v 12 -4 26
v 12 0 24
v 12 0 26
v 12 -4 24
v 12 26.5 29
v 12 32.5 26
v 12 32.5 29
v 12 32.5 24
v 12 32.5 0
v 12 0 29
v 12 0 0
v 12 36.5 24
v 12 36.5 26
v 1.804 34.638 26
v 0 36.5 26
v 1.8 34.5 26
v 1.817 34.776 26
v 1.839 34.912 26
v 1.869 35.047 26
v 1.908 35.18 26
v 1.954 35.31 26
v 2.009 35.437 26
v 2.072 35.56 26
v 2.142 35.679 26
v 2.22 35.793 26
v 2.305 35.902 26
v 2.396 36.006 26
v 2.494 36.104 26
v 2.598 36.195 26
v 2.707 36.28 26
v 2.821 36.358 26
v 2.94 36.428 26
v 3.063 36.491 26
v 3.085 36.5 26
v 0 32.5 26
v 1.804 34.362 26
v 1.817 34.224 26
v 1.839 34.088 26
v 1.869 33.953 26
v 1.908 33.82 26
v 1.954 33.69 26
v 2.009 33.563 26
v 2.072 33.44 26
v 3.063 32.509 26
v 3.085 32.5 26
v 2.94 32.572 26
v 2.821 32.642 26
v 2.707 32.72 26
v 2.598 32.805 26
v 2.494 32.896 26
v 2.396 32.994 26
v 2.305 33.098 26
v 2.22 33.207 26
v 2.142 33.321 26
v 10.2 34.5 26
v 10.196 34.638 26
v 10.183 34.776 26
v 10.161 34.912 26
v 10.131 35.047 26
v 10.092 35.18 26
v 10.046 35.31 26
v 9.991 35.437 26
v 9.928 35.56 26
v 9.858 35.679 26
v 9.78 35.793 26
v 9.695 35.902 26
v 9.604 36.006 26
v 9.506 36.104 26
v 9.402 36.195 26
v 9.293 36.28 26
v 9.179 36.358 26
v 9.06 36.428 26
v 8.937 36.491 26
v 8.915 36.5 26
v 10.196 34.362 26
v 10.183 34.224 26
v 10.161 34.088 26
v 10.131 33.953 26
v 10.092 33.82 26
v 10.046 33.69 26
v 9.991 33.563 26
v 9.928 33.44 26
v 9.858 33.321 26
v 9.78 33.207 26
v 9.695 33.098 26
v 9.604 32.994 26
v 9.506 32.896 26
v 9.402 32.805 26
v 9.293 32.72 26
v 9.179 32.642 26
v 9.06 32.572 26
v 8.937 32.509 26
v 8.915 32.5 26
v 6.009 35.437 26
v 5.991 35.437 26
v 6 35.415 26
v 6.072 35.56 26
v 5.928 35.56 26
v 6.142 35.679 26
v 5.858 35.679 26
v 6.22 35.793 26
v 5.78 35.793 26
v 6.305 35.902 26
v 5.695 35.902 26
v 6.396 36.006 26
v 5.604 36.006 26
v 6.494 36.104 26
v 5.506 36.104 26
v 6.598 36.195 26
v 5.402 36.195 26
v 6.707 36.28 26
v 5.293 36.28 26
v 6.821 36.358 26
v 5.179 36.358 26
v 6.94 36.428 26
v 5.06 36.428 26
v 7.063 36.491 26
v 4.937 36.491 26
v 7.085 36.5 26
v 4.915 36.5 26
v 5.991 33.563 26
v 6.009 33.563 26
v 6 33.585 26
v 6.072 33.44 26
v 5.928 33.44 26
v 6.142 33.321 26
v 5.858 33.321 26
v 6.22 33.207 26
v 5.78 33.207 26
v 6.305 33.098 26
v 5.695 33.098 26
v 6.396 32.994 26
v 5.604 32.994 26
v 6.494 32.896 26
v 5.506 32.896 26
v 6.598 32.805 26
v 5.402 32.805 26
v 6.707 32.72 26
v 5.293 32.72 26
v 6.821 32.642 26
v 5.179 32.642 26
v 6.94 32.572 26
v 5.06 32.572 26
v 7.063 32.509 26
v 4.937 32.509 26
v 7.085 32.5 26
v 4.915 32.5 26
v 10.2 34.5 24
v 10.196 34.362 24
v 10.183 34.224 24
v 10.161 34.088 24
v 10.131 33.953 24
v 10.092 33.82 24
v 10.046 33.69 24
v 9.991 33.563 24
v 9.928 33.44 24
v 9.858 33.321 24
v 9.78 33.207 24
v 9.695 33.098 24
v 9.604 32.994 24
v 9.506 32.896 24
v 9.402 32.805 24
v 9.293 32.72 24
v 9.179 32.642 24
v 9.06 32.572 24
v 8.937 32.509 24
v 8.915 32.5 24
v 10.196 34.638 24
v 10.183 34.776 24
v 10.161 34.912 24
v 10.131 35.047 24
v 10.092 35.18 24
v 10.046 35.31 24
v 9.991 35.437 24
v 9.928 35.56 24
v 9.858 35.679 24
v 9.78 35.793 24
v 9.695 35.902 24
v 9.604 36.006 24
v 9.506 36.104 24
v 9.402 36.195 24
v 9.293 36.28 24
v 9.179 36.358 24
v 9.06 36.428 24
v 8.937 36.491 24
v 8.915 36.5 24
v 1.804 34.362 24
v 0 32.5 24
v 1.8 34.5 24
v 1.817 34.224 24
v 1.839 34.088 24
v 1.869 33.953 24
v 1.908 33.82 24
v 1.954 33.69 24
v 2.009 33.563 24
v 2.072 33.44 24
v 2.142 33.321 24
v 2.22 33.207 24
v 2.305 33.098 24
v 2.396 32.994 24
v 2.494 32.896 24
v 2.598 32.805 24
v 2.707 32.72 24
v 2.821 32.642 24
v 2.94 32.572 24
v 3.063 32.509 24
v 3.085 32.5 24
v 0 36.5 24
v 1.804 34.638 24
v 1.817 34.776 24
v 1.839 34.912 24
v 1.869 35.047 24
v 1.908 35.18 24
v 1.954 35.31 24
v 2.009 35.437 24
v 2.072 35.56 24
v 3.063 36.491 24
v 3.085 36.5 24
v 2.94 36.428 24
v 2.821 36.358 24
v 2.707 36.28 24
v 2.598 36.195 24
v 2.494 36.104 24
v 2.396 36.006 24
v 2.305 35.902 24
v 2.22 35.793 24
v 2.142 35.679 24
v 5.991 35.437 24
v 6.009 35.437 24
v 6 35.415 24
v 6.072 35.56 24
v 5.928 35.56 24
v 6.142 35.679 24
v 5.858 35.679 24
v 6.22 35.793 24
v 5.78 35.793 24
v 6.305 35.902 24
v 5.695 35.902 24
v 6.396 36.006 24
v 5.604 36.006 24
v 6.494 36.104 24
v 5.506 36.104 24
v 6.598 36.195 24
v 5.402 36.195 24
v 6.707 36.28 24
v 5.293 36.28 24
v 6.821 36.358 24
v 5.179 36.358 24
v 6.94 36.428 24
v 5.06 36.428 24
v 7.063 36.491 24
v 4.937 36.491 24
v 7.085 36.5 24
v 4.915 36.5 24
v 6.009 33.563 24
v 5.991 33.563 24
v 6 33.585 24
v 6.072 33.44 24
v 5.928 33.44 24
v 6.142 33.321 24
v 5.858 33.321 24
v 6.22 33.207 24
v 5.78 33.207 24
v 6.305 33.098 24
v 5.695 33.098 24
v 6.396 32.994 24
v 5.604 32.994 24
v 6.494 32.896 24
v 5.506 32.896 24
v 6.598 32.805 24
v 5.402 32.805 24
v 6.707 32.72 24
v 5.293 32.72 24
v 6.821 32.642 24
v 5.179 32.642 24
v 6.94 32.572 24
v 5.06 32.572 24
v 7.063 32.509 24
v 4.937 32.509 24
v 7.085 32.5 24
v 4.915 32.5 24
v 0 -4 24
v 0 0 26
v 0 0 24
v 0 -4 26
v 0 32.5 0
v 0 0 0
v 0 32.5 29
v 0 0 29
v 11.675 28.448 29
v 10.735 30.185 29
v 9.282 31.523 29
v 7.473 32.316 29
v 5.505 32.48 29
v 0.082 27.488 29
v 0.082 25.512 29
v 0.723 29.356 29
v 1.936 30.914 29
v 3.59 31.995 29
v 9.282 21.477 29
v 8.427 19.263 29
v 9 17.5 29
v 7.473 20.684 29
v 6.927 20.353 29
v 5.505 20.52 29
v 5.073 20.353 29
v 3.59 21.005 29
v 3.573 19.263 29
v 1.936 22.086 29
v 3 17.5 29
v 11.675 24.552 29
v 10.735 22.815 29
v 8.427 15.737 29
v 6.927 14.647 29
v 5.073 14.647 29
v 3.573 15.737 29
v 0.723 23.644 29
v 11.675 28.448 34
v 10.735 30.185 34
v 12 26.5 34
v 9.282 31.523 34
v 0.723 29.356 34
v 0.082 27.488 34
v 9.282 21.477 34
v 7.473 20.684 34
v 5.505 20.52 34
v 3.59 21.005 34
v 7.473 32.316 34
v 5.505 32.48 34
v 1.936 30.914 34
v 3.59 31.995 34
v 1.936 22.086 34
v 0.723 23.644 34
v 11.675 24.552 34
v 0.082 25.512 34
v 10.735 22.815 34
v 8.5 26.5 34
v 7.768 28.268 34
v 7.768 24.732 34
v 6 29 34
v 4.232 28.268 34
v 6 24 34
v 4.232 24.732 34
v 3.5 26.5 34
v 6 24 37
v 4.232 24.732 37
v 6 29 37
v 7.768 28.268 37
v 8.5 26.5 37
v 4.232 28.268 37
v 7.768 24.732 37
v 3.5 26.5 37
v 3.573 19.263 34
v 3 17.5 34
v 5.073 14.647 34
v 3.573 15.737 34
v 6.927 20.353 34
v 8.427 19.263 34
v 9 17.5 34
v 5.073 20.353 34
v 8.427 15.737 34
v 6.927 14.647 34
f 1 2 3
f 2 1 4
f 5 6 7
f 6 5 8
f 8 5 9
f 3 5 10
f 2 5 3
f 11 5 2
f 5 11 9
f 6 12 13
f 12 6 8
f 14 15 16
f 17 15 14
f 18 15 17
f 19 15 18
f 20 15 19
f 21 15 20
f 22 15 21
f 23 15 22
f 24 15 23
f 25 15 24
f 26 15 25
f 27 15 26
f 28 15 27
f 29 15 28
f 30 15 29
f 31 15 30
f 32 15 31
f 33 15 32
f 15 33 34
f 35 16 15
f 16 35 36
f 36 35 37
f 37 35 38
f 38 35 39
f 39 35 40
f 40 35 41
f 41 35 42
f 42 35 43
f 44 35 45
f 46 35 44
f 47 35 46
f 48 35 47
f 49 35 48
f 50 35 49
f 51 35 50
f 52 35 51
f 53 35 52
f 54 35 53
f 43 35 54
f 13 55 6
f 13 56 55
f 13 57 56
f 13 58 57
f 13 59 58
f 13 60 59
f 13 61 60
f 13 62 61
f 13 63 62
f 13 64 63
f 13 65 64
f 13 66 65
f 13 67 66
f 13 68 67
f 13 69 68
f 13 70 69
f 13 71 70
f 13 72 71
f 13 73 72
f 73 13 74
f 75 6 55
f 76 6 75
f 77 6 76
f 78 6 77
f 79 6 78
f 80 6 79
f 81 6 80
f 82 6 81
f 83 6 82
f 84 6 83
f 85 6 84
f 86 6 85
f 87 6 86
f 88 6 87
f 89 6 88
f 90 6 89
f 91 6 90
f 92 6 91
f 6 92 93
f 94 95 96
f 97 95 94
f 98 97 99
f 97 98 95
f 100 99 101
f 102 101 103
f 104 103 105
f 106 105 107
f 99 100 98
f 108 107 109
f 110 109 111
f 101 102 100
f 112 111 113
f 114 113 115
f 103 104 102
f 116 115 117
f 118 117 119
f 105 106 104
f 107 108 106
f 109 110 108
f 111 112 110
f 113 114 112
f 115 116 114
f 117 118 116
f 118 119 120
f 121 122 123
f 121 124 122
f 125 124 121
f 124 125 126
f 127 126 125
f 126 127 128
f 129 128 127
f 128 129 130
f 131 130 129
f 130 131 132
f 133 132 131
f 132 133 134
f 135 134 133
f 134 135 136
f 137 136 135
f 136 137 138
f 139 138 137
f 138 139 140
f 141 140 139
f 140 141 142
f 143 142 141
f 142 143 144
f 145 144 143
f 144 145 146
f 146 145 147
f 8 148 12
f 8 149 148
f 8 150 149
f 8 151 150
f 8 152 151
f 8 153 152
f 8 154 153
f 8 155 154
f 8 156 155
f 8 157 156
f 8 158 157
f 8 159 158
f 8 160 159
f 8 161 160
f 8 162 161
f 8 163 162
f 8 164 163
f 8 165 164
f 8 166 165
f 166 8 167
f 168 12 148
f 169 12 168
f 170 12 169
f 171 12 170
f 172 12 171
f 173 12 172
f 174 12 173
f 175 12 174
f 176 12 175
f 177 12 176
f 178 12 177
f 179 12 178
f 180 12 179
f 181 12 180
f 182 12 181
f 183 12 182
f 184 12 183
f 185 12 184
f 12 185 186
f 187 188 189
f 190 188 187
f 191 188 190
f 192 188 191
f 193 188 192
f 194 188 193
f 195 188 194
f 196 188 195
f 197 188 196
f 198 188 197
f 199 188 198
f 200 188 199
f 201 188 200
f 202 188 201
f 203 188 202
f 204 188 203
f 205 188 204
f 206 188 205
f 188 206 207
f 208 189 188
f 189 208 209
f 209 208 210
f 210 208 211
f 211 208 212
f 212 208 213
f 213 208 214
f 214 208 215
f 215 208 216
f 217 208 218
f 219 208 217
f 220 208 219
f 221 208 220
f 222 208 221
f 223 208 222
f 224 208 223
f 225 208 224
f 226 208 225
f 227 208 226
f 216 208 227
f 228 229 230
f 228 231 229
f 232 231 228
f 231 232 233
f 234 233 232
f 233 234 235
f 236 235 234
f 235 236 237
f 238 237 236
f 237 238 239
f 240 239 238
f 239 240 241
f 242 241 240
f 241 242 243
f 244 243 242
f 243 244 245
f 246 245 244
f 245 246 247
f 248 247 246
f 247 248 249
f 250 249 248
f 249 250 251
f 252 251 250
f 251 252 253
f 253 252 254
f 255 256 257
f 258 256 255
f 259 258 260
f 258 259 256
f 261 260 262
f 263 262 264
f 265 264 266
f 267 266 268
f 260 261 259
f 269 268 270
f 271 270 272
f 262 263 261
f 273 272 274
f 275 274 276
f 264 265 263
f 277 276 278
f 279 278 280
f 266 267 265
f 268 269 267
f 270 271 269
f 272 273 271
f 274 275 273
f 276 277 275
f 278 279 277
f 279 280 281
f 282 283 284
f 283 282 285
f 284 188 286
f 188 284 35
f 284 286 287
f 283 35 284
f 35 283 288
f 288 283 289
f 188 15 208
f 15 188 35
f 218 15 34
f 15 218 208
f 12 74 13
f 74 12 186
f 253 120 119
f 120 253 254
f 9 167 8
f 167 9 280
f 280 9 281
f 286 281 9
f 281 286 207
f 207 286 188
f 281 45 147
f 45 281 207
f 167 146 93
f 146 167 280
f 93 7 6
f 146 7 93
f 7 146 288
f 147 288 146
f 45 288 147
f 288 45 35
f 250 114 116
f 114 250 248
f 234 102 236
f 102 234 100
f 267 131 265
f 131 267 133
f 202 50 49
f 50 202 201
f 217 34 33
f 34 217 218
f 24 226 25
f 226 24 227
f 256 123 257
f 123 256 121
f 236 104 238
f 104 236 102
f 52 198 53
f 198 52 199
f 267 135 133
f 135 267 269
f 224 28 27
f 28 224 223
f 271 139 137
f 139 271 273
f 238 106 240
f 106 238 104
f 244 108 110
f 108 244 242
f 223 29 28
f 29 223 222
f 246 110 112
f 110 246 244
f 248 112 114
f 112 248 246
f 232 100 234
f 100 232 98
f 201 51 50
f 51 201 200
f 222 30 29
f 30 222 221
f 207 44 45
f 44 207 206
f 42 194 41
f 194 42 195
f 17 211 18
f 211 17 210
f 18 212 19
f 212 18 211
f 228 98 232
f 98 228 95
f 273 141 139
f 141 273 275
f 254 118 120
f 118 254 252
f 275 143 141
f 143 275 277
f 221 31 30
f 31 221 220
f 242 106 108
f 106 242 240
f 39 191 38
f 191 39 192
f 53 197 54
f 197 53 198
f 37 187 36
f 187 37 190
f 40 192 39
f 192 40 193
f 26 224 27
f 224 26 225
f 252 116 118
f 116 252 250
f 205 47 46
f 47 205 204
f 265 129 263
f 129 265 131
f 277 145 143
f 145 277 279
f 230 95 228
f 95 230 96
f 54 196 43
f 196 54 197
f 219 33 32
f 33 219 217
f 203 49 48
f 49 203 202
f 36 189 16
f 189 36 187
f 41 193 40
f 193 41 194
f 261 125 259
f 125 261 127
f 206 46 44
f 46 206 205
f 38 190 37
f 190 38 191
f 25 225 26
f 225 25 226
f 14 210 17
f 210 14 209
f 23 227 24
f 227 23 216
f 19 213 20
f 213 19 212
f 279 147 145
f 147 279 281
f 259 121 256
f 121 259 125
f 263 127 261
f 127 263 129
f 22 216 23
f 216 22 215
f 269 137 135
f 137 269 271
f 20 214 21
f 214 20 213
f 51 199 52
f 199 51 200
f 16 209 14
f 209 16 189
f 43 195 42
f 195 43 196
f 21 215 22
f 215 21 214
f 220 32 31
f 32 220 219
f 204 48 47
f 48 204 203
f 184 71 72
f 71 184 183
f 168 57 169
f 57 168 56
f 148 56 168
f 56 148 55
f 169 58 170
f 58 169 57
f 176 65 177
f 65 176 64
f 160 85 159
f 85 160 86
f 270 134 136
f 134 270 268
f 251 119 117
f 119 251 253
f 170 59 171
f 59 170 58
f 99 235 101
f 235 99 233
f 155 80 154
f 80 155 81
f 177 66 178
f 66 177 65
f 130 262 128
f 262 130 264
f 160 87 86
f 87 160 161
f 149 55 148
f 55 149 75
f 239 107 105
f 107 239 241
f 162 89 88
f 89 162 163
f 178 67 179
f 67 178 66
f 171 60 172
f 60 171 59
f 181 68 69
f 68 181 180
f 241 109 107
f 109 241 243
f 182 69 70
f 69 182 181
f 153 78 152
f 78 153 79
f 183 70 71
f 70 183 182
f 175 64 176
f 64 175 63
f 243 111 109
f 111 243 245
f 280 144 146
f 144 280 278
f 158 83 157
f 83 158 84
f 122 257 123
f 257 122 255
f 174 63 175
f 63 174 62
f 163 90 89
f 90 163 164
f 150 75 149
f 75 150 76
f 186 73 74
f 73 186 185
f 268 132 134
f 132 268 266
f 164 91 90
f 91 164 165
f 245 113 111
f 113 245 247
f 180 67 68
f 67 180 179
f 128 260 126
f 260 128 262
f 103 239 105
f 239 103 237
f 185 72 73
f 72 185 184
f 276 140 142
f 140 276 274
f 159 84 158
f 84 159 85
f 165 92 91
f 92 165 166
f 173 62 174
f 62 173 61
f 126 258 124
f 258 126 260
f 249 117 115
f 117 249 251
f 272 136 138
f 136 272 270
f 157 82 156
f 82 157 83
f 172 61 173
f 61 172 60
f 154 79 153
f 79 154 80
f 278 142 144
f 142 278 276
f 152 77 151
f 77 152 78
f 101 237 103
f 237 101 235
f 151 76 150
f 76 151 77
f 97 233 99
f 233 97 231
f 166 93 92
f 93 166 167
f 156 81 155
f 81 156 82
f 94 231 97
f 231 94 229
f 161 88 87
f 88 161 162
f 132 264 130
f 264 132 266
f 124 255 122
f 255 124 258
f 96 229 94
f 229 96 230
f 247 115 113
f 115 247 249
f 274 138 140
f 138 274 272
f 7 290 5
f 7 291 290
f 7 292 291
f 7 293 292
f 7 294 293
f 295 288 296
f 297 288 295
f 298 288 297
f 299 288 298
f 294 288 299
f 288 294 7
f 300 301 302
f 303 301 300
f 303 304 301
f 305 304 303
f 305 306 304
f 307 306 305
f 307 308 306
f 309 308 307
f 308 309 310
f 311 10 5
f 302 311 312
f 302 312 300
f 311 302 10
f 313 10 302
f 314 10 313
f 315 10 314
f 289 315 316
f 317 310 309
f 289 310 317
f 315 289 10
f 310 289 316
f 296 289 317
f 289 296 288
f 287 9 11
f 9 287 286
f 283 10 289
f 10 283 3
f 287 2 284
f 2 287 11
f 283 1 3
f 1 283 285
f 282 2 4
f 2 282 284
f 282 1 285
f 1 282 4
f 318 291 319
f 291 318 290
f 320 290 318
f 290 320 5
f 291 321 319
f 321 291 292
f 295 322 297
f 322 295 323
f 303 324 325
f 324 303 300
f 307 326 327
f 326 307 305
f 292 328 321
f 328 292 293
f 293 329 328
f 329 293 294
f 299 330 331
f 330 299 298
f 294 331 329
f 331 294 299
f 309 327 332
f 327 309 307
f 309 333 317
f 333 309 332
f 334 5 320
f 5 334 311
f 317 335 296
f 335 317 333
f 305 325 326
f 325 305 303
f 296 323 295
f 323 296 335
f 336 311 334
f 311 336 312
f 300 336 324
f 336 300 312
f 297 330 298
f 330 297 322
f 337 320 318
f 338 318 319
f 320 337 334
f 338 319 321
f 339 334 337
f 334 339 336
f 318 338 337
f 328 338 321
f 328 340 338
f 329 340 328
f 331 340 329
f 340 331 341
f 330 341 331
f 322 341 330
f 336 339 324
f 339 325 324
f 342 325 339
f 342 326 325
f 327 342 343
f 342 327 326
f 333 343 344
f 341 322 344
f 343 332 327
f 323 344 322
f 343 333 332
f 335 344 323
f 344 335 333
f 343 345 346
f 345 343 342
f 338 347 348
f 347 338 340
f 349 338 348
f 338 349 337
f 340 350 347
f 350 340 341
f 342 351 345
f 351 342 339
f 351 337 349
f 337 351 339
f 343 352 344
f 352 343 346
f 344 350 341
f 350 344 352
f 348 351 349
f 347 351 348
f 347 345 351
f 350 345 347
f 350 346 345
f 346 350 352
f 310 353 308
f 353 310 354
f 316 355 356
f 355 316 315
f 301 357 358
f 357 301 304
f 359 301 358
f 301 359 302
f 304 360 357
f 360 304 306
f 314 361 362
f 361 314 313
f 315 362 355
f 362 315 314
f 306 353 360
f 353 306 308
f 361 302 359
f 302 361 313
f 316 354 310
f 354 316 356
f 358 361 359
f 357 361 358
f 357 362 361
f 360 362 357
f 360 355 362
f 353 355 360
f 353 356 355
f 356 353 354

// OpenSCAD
/*
 ___   ___        ___       __  ___   ___                            
|   |=|_.'   .'|=|_.'  .'|=|  ||   | |   |  .'|=|`.                  
`.  |      .'  |  ___.'  | |  ||   | |   |.'  | |  `.                
  `.|=|`.  |   |=|_.'|   |=|.' |   | |   ||   | |   |                
 ___  |  `.|   |  ___|   |  |`.`.  | |  .'`.  | |  .'                
 `._|=|___||___|=|_.'|___|  |_|  `.|=|.'    `.|=|.'                  
                                                                     
       _        ___  ___   ___     ___                 ___ ___   ___ 
  .'|=| `.  .'|`._|=|   |=|_.'.'|=|_.'  .'| |`.   .'|=|_.'|   |=|_.' 
.'  | | .'.'  |     |   |   .'  |     .'  | |  `.'  |  ___`.  |      
|   |=|'. |   |     |   |   |   |     |   |=|   |   |=|_.'  `.|=|`.  
|   | |  ||   |     `.  |   `.  |  ___|   | |   |   |  ___ ___  |  `.
|___|=|_.'|___|       `.|     `.|=|_.'|___| |___|___|=|_.' `._|=|___|
                                                                     
*/

/*~*~*~*~*~*~*~*~*~*~*~*~Servo Design~*~*~*~*~*~*~*~*~*~*~*~*/

/* Description*/
//This code adapted from work protected by the Collective Commons Attribution-ShareAlike 3.0 Unported license http://creativecommons.org/licenses/by-sa/3.0/legalcode. 
//I made changes to this work in order to accurately reflect the servo motors used in the RaspberrySpy project.


module miniservo(base_x, base_y, base_z, 
	fix_offset, fix_y, fix_z,
	cyl_height, cyl_radius, cyl_offset,
	axe_height, axe_radius) {
	color("LightBlue") cube([base_x, base_y, base_z]);
	color("LightBlue") translate([0, -fix_y, base_z - fix_offset]) 
		cube([base_x, fix_y, fix_z]);
	color("LightBlue") translate([0, base_y, base_z - fix_offset]) 	
difference(){
	cube([base_x, fix_y, fix_z]);
	translate([4,2,0]) cylinder(r=2.2,h=fix_z+1, $fn=100);
	translate([8,2,0]) cylinder(r=2.2,h=fix_z+1, $fn=100);
}

	color("grey") translate([base_x/2, base_y-cyl_offset, base_z]) 
		cylinder(cyl_height, cyl_radius, cyl_radius);
	color("White") translate([base_x/2, base_y-cyl_offset, base_z+cyl_height]) 
		cylinder(axe_height, axe_radius, axe_radius);
}

module TG9() {
	base_x = 12; base_y = 32.5; base_z = 29;
	fix_offset = 5; fix_y = 4; fix_z = 2;
	cyl_height = 5; cyl_radius = 6;	cyl_offset = 6;
	smallcyl_radius = 3; smallcyl_offset = 15;
	axe_height = 3; axe_radius = 2.5;
	union() {
		miniservo(base_x, base_y, base_z,
		 fix_offset, fix_y, fix_z,
		 cyl_height, cyl_radius, cyl_offset,
		 axe_height, axe_radius);
		
		translate([base_x/2, base_y-smallcyl_offset,base_z]) color("Blue") cylinder(cyl_height, smallcyl_radius, smallcyl_radius);
	}
}

TG9(); //Generate servo
